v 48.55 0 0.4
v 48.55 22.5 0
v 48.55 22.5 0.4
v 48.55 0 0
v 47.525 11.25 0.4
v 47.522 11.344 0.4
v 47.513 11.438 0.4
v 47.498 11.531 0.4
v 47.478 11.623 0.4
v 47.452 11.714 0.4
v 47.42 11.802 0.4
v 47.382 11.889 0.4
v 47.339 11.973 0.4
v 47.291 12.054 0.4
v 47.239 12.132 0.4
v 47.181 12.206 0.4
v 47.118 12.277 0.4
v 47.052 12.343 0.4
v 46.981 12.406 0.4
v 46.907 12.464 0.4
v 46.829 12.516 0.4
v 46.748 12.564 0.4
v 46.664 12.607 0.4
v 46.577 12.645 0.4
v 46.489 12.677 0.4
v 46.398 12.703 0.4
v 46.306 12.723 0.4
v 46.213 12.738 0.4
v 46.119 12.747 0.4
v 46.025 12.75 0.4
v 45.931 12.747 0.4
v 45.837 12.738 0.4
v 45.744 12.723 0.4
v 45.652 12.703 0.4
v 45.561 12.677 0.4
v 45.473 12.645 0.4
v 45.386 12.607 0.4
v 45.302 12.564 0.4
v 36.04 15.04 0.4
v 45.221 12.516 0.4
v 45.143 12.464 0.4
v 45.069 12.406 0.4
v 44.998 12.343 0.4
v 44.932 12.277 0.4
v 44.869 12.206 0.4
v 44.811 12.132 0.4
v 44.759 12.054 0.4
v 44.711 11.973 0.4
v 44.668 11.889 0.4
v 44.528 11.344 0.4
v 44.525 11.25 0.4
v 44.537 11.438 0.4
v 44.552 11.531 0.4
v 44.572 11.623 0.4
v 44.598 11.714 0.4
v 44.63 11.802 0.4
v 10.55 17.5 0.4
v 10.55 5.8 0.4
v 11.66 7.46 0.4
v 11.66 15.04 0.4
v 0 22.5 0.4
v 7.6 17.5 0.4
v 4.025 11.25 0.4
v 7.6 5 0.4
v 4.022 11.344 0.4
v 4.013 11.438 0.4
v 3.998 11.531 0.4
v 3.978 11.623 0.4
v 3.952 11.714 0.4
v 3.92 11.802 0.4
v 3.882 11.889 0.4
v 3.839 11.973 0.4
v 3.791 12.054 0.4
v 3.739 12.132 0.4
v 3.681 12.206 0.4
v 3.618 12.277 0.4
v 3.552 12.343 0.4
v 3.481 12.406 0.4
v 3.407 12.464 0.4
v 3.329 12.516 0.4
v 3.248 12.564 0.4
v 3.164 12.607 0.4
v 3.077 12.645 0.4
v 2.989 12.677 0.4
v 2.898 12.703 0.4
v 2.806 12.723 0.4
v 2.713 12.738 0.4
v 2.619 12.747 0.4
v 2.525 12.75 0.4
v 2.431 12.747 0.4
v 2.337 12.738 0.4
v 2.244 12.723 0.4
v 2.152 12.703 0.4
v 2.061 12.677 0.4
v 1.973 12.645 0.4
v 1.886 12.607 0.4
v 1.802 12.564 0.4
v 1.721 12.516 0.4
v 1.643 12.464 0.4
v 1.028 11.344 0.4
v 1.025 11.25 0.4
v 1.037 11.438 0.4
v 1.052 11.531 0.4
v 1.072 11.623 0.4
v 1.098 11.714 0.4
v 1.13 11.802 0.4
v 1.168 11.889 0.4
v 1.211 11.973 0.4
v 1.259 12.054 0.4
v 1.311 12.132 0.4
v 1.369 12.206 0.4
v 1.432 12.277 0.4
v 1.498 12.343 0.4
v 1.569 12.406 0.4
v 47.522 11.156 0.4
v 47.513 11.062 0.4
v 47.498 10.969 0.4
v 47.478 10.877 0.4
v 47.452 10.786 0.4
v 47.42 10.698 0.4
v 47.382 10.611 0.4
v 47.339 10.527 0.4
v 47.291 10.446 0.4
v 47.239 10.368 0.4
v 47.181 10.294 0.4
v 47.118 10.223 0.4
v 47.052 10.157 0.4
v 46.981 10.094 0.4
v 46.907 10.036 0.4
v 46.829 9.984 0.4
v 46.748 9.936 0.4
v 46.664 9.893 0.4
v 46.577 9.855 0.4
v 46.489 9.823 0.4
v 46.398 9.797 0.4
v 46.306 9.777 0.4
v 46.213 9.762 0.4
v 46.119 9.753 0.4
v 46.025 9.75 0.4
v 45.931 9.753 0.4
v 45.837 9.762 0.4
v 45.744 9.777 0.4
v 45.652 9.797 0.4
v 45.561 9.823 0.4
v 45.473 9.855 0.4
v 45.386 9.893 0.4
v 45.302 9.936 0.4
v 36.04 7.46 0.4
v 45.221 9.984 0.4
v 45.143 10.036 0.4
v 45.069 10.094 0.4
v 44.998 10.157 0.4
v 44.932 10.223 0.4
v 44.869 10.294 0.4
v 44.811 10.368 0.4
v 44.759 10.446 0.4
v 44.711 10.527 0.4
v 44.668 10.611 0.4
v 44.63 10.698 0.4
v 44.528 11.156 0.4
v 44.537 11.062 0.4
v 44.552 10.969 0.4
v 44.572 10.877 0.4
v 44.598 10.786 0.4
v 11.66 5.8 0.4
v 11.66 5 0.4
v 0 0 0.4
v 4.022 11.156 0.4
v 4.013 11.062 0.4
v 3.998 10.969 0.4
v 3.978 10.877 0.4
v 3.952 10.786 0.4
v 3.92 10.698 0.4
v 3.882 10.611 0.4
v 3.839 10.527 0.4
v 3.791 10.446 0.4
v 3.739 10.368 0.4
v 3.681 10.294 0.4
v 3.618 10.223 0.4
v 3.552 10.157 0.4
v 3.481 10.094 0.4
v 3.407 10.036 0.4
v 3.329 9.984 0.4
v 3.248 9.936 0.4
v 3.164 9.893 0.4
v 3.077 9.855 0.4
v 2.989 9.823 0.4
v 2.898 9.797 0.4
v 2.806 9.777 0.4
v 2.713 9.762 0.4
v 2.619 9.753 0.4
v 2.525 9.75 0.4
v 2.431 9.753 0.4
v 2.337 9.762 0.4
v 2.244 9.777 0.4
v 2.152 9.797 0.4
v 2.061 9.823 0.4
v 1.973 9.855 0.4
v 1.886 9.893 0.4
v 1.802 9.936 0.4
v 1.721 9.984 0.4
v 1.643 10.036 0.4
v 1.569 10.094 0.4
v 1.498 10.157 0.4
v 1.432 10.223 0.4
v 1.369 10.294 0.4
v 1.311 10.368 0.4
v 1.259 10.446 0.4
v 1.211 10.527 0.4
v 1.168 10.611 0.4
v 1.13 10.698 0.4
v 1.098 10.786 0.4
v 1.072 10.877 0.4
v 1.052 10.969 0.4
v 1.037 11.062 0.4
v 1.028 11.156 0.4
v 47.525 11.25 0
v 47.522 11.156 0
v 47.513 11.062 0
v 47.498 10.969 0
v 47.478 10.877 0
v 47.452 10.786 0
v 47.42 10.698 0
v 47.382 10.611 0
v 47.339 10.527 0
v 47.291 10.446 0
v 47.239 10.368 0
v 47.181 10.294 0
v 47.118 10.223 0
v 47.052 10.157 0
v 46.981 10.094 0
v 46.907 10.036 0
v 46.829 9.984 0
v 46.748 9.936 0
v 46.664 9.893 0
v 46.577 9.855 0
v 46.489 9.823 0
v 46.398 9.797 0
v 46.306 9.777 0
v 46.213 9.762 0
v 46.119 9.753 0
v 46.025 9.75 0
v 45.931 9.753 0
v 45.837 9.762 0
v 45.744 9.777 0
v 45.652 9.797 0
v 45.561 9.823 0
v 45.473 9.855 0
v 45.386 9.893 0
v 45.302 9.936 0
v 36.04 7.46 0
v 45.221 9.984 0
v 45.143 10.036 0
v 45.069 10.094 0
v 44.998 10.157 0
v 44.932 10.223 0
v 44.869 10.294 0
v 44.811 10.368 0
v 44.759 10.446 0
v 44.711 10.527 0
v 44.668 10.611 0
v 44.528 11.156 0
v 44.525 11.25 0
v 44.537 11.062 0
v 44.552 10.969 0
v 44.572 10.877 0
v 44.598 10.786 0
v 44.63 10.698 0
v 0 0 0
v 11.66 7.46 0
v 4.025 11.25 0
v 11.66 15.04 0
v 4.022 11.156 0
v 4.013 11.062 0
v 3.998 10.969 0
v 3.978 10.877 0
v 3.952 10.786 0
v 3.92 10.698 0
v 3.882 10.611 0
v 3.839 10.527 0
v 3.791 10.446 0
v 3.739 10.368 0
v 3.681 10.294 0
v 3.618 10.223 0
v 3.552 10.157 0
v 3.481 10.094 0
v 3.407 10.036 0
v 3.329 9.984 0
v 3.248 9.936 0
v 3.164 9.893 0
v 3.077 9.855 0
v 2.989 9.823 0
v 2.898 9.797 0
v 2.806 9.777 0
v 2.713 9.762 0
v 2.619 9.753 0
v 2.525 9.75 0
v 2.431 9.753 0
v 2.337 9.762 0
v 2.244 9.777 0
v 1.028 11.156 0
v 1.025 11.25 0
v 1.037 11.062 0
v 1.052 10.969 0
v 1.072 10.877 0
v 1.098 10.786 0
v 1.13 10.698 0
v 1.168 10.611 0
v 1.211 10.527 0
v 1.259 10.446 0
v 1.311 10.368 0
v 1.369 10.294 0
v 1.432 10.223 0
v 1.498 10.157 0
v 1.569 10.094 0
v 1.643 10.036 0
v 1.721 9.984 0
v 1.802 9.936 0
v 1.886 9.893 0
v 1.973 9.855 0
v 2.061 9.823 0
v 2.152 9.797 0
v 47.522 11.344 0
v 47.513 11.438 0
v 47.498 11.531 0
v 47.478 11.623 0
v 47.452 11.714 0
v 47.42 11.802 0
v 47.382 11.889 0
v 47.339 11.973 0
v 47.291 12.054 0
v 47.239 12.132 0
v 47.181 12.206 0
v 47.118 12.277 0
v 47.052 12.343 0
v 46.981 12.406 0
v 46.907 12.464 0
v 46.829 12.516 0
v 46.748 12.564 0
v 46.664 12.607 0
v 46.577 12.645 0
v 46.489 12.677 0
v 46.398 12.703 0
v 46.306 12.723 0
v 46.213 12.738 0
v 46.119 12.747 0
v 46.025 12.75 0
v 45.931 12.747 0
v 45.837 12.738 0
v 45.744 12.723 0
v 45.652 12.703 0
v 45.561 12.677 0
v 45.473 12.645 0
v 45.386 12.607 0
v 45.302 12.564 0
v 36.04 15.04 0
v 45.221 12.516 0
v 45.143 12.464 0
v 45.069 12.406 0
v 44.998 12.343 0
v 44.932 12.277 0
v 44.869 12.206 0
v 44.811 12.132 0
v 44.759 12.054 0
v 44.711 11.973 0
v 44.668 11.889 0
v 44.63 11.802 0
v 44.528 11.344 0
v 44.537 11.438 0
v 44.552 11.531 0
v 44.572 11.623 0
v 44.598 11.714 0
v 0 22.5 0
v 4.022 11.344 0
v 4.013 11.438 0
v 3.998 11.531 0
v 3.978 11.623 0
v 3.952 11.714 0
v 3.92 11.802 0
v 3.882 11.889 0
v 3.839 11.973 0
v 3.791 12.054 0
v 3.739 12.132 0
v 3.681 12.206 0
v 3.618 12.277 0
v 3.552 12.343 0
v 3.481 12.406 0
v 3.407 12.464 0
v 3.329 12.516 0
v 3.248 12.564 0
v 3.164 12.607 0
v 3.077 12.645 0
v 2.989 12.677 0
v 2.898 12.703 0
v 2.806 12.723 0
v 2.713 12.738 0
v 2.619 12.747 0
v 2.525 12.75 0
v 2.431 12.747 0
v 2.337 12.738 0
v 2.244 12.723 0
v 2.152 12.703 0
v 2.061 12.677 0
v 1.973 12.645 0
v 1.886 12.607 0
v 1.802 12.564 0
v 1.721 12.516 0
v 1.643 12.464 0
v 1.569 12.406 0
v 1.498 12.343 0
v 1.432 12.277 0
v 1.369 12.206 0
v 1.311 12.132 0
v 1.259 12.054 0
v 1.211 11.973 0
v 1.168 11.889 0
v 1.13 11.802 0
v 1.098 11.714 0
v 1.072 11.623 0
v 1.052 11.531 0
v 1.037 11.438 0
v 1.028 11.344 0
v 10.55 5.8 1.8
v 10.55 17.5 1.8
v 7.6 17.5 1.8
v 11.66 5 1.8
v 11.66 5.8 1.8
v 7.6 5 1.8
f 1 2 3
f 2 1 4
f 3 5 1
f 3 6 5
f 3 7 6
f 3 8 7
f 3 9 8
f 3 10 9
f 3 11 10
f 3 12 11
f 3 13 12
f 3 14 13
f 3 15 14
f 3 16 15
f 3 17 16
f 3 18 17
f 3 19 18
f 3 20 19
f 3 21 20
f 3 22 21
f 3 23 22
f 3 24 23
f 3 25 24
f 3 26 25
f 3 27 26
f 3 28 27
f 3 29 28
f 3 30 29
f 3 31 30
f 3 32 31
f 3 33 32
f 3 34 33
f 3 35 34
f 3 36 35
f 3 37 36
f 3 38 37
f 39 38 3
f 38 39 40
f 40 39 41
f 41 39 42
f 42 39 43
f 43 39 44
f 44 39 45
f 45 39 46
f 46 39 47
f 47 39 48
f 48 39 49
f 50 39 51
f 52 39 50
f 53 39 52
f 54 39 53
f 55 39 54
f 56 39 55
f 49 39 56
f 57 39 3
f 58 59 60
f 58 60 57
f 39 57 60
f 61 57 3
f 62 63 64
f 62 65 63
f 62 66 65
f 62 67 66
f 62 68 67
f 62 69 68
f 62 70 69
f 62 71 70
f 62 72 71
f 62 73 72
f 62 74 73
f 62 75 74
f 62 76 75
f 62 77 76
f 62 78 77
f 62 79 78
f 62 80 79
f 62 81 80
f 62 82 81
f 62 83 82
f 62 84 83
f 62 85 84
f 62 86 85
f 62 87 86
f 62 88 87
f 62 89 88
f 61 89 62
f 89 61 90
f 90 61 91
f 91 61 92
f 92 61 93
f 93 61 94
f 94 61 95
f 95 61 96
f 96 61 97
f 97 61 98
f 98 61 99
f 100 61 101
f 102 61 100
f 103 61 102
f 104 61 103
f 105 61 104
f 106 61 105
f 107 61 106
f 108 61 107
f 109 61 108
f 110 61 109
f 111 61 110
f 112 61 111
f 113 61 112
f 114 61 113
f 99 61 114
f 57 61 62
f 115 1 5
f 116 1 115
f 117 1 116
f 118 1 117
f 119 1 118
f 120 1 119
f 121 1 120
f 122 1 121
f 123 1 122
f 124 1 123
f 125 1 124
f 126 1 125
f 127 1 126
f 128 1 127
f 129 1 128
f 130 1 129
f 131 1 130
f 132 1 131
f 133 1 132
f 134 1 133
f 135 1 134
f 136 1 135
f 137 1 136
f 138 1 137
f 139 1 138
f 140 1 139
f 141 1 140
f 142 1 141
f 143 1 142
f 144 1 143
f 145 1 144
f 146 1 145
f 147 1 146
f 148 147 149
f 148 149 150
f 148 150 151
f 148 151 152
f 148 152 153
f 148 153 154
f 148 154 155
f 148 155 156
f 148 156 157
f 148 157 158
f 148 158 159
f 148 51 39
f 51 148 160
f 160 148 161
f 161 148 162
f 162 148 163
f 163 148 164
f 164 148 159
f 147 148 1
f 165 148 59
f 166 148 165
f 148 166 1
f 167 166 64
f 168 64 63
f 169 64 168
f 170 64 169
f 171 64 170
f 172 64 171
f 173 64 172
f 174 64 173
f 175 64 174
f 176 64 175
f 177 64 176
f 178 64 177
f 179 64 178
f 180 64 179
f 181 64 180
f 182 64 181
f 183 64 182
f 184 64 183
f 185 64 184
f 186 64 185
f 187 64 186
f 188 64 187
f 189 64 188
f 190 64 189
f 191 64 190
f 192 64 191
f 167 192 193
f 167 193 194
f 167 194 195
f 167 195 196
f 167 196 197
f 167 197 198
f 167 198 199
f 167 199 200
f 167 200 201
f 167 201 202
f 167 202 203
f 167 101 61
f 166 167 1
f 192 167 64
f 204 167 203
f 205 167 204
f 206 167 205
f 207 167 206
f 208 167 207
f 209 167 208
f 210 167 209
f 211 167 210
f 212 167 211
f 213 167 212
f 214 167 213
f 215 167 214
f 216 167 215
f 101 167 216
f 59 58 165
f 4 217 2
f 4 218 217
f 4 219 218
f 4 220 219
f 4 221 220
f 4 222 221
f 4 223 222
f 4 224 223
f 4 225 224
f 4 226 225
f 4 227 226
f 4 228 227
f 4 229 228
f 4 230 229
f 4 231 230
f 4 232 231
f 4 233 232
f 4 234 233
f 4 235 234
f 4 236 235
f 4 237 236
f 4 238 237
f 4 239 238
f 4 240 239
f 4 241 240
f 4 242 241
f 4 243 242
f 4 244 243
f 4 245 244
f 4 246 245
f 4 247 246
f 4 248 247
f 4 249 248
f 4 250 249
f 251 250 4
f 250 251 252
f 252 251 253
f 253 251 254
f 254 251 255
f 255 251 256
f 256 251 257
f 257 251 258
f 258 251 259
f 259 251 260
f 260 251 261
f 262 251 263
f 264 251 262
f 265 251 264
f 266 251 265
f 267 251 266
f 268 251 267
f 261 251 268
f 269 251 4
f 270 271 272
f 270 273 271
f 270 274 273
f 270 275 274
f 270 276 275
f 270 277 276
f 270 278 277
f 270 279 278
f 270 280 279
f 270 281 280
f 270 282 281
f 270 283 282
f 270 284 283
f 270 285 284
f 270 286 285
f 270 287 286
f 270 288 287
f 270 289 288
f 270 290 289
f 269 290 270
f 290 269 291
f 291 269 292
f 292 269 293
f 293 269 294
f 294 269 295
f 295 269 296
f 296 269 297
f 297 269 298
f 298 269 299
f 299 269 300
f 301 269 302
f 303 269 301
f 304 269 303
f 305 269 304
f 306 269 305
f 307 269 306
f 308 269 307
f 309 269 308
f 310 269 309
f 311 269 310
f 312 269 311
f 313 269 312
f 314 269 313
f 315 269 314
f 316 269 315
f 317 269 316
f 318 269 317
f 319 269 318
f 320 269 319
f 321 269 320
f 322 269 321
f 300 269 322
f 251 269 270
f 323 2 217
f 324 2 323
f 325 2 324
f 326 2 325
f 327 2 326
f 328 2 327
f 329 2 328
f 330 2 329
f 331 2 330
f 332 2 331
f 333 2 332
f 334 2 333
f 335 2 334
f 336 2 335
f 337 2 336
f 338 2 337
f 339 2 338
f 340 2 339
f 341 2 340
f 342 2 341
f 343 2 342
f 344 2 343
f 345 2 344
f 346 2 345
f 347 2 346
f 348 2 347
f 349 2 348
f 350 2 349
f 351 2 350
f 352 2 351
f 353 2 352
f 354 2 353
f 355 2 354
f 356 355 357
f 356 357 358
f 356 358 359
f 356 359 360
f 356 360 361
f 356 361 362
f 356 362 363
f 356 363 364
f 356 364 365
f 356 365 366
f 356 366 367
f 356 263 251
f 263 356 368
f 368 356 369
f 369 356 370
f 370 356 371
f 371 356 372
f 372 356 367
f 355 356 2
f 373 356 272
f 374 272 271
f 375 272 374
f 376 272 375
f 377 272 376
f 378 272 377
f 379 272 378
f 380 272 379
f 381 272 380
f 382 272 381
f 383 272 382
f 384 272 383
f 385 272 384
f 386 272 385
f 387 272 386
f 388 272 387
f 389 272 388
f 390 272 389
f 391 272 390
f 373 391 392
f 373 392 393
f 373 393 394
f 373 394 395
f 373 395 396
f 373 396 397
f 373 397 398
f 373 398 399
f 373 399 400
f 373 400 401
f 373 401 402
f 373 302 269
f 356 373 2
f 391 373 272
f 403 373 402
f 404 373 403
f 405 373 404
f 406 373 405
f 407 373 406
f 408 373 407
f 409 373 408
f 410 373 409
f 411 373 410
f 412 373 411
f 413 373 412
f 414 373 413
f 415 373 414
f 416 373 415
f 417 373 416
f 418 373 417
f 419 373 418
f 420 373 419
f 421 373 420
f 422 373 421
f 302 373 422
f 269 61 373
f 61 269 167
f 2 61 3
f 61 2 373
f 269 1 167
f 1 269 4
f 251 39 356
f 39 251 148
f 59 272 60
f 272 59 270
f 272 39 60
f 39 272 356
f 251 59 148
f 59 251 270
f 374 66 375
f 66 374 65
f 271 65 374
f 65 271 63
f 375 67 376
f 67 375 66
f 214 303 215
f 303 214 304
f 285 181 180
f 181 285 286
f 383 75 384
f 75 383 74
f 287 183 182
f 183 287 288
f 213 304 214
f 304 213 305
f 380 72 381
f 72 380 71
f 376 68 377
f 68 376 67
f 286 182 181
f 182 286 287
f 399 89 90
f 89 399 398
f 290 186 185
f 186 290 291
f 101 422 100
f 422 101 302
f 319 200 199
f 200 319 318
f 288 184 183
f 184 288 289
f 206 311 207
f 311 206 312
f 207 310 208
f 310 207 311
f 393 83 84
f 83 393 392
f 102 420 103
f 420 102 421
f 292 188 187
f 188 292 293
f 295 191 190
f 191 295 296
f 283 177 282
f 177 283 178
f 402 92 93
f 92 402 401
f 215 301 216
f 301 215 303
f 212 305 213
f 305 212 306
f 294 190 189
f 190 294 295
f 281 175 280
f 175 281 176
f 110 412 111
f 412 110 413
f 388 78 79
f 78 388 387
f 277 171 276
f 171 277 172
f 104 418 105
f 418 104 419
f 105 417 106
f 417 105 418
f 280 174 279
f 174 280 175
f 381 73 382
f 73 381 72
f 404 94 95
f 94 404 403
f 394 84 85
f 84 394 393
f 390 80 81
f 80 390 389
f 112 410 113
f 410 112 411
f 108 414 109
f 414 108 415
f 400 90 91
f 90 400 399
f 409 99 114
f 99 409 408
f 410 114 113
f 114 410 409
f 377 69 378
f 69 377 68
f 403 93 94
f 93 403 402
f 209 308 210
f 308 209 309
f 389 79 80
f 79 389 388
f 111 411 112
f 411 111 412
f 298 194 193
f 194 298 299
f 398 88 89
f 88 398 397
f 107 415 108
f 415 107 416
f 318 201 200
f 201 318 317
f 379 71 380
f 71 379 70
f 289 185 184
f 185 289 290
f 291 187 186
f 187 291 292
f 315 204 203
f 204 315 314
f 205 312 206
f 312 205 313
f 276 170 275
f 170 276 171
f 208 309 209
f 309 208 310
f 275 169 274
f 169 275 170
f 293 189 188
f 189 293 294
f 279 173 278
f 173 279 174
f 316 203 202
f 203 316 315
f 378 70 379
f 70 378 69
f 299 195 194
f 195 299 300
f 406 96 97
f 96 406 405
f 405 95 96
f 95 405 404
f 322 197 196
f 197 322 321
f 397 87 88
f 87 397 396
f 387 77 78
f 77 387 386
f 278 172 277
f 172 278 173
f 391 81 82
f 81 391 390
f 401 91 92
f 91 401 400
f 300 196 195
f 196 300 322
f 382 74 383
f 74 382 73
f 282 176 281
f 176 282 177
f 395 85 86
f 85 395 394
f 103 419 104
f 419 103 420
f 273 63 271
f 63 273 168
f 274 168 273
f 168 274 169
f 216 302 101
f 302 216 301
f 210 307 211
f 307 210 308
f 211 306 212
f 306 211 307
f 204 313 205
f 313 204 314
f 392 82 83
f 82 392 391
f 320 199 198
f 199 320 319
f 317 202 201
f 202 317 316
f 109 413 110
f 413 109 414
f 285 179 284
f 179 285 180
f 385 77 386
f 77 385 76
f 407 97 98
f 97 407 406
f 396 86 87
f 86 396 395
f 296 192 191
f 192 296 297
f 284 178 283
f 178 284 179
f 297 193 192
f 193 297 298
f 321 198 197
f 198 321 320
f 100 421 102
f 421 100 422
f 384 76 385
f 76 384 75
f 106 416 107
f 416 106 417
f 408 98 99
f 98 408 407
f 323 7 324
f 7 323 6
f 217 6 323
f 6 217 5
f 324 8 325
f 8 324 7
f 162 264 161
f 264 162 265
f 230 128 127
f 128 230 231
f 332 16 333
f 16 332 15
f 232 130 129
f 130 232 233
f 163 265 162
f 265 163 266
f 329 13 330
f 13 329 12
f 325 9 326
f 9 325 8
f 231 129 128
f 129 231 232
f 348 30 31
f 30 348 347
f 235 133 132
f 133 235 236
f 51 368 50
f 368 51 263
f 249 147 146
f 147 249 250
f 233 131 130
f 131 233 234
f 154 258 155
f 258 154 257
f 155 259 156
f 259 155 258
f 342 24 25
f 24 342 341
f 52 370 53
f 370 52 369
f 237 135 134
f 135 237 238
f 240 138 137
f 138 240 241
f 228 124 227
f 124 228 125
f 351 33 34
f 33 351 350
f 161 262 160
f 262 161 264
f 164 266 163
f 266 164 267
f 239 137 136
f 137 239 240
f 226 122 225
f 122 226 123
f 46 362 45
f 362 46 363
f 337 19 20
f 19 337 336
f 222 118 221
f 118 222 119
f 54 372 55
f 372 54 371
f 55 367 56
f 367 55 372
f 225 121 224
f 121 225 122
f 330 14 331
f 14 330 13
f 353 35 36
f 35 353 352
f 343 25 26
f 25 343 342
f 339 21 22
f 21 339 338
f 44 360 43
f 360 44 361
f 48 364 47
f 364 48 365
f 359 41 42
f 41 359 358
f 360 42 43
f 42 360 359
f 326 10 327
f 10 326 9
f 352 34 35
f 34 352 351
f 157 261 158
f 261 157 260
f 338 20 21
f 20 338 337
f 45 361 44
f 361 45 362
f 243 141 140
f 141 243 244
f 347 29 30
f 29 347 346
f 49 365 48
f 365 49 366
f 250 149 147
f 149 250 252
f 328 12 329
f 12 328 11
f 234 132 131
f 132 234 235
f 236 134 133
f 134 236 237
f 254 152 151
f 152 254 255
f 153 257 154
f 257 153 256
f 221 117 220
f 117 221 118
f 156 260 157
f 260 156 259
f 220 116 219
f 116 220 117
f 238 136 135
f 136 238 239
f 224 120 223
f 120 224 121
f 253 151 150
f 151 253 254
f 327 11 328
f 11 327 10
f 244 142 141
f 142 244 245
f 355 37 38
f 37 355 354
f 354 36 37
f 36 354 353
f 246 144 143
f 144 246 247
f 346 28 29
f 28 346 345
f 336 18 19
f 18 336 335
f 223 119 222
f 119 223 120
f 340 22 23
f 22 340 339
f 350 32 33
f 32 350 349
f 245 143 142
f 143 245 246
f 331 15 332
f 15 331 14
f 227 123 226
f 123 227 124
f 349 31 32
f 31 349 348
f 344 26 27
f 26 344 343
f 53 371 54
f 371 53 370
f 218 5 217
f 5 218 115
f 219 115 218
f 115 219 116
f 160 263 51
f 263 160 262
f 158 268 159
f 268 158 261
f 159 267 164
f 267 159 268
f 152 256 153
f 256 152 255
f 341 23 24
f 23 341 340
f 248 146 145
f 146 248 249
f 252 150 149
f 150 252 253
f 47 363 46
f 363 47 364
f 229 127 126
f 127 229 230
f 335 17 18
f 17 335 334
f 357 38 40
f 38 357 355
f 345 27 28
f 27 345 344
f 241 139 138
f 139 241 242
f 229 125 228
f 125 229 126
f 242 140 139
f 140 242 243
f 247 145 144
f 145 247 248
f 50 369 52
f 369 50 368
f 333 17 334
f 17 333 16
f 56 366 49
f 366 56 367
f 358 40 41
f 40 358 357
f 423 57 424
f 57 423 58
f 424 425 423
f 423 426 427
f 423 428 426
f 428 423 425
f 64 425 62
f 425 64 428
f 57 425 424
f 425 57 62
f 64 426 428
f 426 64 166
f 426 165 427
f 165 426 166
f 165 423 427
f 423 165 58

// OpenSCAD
topWidth = 48.55;
topHeight = 22.5;
topDepth = 0.4;

holeWidth = 24.38;
holeHeight = 7.58;
holeX = 11.66;
holeY = 7.46;

screwHoleDiameter = 3;
screwDistance = 43.5;
screwX = (topWidth - screwDistance) / 2;
screwY = 11.25;

reinforcementHeight = 12.5;
reinforcementWidth = 2.95;
reinforcementDepth = 1.8;
reinforcementX = 7.6;
reinforcementY = 5;
reinforcementFootLength = 1.11;
reinforcementFootHeight = 0.8;

union() {
    difference() {
        cube(size = [topWidth, topHeight, topDepth]);
        translate([holeX, holeY, - .05]) cube(size = [holeWidth, holeHeight, topDepth + 0.1]);
        translate([screwX, screwY, - .05]) cylinder(h = topDepth + .1, r = screwHoleDiameter / 2, $fn = 100);
        translate([topWidth - screwX, screwY, - .05]) cylinder(h = topDepth + .1, r = screwHoleDiameter / 2, $fn = 100);
    }
    translate([reinforcementX, reinforcementY, 0])
        union() {
            cube(size = [reinforcementWidth, reinforcementHeight, reinforcementDepth]);
            translate([reinforcementWidth, 0, 0])
                cube(size = [reinforcementFootLength, reinforcementFootHeight, reinforcementDepth]);
        }
}
